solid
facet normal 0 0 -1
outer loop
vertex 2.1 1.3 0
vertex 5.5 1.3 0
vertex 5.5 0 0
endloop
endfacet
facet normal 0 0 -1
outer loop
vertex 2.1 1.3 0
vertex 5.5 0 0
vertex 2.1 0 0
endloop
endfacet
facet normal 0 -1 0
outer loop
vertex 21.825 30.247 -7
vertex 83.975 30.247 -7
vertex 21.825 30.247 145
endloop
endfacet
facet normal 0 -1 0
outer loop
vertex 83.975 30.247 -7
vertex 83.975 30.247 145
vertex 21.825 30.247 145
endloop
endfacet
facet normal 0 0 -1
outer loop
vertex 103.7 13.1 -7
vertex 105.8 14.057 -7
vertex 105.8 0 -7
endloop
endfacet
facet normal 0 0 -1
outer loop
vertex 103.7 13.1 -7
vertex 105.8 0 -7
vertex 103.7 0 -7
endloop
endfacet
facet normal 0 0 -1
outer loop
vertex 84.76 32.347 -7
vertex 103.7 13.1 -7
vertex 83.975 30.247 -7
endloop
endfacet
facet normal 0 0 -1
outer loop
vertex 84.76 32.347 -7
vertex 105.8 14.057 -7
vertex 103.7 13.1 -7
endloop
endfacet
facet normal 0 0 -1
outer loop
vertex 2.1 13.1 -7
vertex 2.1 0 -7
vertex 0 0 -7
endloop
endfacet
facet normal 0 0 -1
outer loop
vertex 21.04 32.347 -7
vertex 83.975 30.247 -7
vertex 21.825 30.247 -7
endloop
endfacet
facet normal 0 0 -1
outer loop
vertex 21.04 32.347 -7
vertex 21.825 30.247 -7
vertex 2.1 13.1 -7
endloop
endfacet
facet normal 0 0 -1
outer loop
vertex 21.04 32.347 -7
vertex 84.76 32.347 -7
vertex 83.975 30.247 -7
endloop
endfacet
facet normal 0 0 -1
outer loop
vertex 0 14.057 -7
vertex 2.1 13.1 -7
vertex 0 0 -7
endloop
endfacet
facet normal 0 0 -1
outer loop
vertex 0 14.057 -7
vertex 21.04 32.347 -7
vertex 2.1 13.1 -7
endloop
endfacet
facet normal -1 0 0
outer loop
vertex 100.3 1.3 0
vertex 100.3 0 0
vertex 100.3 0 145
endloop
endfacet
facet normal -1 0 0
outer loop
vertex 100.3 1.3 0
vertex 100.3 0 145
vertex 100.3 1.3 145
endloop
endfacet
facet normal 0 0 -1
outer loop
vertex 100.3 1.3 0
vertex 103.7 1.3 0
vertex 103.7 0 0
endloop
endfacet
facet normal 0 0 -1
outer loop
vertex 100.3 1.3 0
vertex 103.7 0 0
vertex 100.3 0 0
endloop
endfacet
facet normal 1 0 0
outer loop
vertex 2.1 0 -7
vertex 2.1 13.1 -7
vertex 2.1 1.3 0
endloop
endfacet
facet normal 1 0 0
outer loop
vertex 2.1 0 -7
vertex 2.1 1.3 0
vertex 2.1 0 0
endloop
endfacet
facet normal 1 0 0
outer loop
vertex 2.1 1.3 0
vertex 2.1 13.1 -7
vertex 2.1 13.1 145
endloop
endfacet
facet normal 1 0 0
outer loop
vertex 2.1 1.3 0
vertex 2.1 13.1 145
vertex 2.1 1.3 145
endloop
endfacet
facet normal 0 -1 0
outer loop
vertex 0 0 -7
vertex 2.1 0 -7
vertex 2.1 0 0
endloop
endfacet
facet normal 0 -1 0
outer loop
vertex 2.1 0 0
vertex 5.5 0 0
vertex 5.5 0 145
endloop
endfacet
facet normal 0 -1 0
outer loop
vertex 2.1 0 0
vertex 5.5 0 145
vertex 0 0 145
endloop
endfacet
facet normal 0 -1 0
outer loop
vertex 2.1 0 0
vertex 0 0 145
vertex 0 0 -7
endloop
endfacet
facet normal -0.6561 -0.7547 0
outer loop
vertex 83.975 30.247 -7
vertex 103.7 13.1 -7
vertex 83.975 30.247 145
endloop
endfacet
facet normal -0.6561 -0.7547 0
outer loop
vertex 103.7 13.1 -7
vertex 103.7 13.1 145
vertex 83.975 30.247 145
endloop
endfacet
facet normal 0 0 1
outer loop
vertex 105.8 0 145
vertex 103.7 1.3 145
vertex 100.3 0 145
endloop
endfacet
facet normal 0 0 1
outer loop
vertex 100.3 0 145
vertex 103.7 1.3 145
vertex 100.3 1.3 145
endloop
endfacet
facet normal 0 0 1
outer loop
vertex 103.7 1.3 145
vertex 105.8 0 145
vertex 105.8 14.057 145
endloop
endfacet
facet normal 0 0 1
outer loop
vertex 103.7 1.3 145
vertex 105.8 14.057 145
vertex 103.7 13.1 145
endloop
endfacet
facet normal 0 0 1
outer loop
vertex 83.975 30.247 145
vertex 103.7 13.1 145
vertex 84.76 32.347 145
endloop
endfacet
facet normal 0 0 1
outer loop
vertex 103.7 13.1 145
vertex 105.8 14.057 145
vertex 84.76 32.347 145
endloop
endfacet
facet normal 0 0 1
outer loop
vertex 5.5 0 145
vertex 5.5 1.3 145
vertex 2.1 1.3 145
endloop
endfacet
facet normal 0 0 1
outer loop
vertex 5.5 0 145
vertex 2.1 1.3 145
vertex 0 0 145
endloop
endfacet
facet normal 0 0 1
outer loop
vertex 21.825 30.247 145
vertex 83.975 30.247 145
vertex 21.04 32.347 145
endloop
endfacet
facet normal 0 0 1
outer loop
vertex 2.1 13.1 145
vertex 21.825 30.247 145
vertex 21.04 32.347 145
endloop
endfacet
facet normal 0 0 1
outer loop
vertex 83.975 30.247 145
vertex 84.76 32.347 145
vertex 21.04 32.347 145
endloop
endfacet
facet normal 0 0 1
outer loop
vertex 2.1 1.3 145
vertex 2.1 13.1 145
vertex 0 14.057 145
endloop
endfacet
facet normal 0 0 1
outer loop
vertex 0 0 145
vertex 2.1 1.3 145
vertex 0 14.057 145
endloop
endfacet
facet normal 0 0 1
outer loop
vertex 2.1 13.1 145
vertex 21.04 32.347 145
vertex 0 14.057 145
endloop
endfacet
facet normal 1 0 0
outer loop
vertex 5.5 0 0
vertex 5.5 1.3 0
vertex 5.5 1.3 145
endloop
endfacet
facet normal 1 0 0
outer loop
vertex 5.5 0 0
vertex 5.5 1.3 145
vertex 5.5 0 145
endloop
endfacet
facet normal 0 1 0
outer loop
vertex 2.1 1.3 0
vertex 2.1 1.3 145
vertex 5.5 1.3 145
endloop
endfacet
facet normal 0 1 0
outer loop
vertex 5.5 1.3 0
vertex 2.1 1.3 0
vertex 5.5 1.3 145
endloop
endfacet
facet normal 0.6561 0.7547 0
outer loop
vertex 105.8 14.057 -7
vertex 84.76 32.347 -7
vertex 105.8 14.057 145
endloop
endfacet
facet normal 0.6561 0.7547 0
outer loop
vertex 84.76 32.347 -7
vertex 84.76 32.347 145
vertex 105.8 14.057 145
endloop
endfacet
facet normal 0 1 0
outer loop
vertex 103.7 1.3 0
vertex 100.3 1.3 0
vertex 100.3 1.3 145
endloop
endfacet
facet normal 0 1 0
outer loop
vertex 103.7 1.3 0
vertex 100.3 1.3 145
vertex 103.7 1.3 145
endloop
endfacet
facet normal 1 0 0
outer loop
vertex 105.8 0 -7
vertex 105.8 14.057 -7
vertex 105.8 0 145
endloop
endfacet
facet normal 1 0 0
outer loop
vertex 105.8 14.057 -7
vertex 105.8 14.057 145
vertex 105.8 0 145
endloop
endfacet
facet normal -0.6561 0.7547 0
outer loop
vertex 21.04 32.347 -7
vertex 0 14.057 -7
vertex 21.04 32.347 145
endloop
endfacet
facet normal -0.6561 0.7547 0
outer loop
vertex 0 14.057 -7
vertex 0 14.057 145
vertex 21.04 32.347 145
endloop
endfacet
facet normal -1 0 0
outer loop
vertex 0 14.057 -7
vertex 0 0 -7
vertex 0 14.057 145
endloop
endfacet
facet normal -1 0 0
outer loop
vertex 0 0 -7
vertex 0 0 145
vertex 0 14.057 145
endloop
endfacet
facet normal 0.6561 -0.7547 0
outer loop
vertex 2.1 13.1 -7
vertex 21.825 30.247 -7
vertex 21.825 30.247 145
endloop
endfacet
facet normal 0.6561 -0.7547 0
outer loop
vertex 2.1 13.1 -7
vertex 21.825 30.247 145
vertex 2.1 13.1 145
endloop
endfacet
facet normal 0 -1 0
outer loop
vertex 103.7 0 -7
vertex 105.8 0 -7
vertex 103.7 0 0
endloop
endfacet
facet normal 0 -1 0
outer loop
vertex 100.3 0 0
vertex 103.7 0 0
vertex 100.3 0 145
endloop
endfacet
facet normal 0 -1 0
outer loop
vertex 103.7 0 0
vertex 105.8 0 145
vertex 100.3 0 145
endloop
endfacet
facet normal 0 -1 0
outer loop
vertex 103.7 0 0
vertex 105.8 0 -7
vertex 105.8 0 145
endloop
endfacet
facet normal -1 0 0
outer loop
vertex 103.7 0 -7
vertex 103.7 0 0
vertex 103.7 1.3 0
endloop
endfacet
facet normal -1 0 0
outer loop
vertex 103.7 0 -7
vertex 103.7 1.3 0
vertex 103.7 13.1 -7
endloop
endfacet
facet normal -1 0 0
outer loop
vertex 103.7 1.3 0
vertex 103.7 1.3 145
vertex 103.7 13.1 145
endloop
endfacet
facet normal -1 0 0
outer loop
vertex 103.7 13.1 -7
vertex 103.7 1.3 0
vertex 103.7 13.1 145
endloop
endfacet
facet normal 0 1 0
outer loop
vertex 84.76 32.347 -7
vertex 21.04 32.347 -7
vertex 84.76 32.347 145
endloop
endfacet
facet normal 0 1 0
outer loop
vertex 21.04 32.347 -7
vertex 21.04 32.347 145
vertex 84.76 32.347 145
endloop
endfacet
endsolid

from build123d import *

# Parameters (mm, degrees)
BOSS_EXTRUDE1_DEPTH = 145
BOSS_EXTRUDE2_DEPTH = 7


with BuildPart() as part:
    # Sketch1 → Boss-Extrude1 (new body)
    with BuildSketch(Plane.XY):
        Polygon((2.1, 1.3), (5.5, 1.3), (5.5, 0), (0, 0), (0, 14.057025137), (21.040065237, 32.34687481), (84.759934763, 32.34687481), (105.8, 14.057025137), (105.8, 0), (100.3, 0), (100.3, 1.3), (103.7, 1.3), (103.7, 13.1), (83.974776936, 30.24687481), (21.825223064, 30.24687481), (2.1, 13.1), align=None)
    extrude(amount=BOSS_EXTRUDE1_DEPTH)

    # Sketch2 → Boss-Extrude2 (add)
    with BuildSketch(Plane(origin=(0, 0, 0), x_dir=(-1, 0, 0), z_dir=(0, 0, -1))):
        Polygon((-2.1, 0), (0, 0), (0, 14.057025137), (-21.040065237, 32.34687481), (-84.759934763, 32.34687481), (-105.8, 14.057025137), (-105.8, 0), (-103.7, 0), (-103.7, 13.1), (-83.974776936, 30.24687481), (-21.825223064, 30.24687481), (-2.1, 13.1), align=None)
    extrude(amount=BOSS_EXTRUDE2_DEPTH)


solid = part.part
